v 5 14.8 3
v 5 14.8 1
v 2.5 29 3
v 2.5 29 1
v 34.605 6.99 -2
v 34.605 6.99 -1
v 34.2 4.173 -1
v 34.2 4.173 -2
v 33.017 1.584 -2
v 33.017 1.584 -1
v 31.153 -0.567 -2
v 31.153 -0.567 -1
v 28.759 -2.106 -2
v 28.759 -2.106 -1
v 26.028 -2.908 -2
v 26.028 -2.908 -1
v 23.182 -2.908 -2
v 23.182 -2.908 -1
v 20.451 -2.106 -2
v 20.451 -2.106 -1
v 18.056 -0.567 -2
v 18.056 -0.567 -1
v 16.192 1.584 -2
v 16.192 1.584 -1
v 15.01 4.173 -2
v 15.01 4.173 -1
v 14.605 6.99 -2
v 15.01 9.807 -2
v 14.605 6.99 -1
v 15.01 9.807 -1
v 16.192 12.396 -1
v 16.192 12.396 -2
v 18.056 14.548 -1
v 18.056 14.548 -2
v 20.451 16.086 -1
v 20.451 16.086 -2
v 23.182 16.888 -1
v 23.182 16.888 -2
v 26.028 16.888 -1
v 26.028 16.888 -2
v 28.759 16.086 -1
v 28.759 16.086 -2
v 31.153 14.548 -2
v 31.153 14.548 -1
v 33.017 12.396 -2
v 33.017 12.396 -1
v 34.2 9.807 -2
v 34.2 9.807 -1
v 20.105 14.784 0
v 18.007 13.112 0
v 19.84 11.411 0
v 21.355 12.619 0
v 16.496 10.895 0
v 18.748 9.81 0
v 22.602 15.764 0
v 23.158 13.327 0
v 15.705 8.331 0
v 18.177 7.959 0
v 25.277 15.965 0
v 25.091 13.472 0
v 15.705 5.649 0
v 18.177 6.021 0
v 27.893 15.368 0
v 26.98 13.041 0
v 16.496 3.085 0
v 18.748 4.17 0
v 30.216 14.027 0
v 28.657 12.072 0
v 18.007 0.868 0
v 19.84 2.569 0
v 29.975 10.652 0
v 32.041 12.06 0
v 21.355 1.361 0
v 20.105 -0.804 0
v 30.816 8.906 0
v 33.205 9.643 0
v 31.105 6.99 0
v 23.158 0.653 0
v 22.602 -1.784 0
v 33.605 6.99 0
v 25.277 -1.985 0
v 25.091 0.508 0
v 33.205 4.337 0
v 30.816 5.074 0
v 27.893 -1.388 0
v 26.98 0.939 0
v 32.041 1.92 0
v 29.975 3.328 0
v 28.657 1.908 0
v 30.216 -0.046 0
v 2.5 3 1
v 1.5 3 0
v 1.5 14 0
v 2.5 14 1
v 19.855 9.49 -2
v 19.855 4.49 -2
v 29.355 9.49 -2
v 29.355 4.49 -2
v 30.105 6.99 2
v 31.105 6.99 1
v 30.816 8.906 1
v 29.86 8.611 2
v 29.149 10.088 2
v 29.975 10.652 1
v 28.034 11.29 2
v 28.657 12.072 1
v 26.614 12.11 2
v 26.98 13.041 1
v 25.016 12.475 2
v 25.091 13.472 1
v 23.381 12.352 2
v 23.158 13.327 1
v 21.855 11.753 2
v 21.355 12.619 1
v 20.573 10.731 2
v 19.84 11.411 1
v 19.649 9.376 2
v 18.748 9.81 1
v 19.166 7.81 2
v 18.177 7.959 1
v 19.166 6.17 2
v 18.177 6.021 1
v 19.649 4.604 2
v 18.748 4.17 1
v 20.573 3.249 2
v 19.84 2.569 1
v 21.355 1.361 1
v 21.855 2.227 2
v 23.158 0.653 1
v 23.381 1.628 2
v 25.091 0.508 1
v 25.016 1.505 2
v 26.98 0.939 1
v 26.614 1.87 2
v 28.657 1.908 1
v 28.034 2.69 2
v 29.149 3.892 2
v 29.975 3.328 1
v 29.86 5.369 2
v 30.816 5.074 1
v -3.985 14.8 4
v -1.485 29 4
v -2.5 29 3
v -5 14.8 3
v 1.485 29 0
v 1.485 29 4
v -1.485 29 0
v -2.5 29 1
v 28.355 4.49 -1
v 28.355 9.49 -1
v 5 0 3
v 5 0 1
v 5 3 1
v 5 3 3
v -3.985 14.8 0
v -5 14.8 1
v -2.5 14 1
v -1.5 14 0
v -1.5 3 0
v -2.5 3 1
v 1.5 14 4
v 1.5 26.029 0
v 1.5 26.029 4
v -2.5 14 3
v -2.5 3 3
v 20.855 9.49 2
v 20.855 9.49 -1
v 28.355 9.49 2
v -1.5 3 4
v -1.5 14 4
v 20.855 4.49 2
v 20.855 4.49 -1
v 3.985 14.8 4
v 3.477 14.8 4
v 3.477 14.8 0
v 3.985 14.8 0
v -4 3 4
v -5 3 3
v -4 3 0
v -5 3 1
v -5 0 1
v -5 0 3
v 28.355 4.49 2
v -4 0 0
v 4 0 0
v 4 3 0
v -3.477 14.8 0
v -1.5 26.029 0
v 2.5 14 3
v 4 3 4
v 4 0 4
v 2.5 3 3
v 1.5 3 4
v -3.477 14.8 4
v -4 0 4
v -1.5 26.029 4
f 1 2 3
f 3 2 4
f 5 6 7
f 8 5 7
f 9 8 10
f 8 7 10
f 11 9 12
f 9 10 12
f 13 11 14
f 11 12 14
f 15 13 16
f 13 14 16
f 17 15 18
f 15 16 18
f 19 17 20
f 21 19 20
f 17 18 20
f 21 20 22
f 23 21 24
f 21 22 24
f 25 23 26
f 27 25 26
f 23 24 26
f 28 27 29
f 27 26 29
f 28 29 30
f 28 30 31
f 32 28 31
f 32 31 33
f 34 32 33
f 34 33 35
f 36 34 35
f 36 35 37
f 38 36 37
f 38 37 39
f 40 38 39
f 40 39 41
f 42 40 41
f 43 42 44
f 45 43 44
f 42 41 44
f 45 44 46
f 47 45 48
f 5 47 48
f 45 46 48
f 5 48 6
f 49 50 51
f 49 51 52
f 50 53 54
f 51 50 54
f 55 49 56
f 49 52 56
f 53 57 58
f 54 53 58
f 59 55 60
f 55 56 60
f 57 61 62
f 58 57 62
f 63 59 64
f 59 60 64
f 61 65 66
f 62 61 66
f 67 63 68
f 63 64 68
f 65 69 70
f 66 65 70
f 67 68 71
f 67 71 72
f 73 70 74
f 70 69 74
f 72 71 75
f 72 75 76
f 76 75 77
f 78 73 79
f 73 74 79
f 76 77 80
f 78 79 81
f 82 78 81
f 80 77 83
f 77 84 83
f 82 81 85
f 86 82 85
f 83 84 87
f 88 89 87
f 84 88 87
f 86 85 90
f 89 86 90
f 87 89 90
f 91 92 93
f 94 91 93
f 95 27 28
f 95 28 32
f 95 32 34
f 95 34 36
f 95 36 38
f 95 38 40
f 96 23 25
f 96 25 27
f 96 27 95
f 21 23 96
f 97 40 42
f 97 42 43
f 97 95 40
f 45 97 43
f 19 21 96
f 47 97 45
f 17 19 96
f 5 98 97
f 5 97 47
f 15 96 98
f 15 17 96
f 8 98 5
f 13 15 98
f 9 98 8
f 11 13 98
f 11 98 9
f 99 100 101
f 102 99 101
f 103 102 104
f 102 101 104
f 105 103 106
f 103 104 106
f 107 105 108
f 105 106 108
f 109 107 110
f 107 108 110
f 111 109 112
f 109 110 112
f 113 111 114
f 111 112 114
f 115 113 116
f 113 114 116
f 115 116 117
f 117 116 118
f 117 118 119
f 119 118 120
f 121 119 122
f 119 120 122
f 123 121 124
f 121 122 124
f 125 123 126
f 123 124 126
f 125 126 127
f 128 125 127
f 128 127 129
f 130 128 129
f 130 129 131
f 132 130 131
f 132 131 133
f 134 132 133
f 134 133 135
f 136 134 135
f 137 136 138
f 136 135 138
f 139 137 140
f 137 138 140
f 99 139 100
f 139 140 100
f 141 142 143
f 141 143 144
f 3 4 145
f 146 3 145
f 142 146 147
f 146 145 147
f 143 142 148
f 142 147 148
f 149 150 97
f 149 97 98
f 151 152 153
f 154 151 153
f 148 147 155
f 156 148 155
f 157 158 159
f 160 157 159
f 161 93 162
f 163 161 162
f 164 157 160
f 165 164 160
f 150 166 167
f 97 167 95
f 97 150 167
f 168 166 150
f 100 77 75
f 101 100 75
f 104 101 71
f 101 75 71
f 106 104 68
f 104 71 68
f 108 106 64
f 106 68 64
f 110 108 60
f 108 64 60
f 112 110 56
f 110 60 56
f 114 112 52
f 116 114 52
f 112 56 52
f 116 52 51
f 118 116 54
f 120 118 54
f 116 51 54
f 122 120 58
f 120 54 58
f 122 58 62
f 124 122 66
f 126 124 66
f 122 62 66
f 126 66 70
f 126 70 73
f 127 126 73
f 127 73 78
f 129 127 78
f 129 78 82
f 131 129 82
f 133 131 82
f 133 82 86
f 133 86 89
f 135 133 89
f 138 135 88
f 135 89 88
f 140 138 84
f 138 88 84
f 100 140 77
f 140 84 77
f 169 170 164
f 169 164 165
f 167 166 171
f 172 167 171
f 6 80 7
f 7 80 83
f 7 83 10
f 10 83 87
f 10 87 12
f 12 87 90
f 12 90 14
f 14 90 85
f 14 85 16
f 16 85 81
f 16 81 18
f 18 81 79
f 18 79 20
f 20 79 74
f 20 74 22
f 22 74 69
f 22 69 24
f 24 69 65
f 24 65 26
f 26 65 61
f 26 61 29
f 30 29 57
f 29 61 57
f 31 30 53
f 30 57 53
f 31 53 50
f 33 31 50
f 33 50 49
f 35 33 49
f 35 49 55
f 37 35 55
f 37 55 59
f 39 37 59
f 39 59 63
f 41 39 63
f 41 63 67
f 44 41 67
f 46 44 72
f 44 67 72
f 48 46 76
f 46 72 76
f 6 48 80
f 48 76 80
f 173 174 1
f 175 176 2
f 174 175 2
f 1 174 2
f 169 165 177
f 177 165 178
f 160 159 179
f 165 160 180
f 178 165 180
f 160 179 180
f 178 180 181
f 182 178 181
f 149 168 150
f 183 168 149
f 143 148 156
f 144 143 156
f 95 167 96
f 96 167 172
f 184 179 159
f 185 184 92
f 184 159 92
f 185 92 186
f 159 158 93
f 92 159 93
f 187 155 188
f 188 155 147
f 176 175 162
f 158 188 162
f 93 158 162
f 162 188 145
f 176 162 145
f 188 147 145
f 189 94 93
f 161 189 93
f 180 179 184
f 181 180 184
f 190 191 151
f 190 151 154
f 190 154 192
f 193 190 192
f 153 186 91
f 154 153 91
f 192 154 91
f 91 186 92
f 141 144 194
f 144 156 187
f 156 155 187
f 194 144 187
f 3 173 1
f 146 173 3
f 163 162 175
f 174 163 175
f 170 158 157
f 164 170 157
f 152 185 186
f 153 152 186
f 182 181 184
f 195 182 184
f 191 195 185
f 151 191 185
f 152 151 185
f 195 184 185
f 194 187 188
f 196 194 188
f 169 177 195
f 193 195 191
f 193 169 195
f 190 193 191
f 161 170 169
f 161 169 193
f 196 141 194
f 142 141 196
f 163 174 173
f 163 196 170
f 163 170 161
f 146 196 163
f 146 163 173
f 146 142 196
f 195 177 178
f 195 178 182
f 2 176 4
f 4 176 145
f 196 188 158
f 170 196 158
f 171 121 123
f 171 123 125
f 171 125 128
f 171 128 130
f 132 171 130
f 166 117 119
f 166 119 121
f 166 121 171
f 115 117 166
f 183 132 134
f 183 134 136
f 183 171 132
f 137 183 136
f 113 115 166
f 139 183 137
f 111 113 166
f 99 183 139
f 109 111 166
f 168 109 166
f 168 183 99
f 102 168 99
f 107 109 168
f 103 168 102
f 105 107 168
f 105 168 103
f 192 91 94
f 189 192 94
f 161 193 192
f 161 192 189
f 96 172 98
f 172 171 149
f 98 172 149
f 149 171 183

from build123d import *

# Parameters (mm, degrees)
F1_DEPTH = 4
F2_R     = 6.5
F2_W     = 7.5
F2_H     = 5
F3_DEPTH = 2
F4_SIZE  = 1
F5_SIZE  = 1
F6_R     = 10
F6_W     = 7.5
F6_H     = 5
F7_DEPTH = 2
F8_SIZE  = 1


with BuildPart() as f1:
    # F0 (on Top) → F1 (new body)
    with BuildSketch(Plane.XY):
        Polygon((-2.5, 29), (-5, 14.8), (-3.476931, 14.8), (-1.5, 26.028965), (-1.5, 14), (-2.5, 14), (-2.5, 3), (-5, 3), (-5, 0), (5, 0), (5, 3), (2.5, 3), (2.5, 14), (1.5, 14), (1.5, 26.028965), (3.476931, 14.8), (5, 14.8), (2.5, 29), align=None)
    extrude(amount=F1_DEPTH)

    # F4
    f4_edges = [f1.edges().sort_by_distance(p)[0] for p in [
        (2.5, 8.5, 0),
        (3.75, 21.9, 0),
        (-2.5, 8.5, 0),
        (-3.75, 21.9, 0),
        (-2.5, 8.5, 4),
        (2.5, 8.5, 4),
        (3.75, 21.9, 4),
        (-3.75, 21.9, 4),
    ]]
    chamfer(f4_edges, length=F4_SIZE)

    # F5
    f5_edges = [f1.edges().sort_by_distance(p)[0] for p in [
        (5, 1.5, 0),
        (-5, 1.5, 0),
        (-5, 1.5, 4),
        (5, 1.5, 4),
    ]]
    chamfer(f5_edges, length=F5_SIZE)


with BuildPart() as f3:
    # F2 (on Top) → F3 (new body)
    with BuildSketch(Plane.XY):
        with Locations((24.604785, 6.99003)):
            Circle(F2_R)
        with Locations((24.604785, 6.99003)):
            Rectangle(F2_W, F2_H, mode=Mode.SUBTRACT)
    extrude(amount=F3_DEPTH)

    # F6 (on face) → F7 (join)
    with BuildSketch(Plane(origin=(0, 0, 0), x_dir=(1, 0, 0), z_dir=(0, 0, -1))):
        with Locations((24.604785, -6.99003)):
            Circle(F6_R)
        with Locations((24.604785, -6.99003)):
            Rectangle(F6_W, F6_H, mode=Mode.SUBTRACT)
    extrude(amount=F7_DEPTH)

    # F8
    f8_edges = [f3.edges().sort_by_distance(p)[0] for p in [
        (20.854785, 6.99003, -2),
        (28.354785, 6.99003, -2),
        (18.104785, 6.99003, 2),
        (14.604785, 6.99003, 0),
    ]]
    chamfer(f8_edges, length=F8_SIZE)


solid = Compound([f1.part, f3.part])
